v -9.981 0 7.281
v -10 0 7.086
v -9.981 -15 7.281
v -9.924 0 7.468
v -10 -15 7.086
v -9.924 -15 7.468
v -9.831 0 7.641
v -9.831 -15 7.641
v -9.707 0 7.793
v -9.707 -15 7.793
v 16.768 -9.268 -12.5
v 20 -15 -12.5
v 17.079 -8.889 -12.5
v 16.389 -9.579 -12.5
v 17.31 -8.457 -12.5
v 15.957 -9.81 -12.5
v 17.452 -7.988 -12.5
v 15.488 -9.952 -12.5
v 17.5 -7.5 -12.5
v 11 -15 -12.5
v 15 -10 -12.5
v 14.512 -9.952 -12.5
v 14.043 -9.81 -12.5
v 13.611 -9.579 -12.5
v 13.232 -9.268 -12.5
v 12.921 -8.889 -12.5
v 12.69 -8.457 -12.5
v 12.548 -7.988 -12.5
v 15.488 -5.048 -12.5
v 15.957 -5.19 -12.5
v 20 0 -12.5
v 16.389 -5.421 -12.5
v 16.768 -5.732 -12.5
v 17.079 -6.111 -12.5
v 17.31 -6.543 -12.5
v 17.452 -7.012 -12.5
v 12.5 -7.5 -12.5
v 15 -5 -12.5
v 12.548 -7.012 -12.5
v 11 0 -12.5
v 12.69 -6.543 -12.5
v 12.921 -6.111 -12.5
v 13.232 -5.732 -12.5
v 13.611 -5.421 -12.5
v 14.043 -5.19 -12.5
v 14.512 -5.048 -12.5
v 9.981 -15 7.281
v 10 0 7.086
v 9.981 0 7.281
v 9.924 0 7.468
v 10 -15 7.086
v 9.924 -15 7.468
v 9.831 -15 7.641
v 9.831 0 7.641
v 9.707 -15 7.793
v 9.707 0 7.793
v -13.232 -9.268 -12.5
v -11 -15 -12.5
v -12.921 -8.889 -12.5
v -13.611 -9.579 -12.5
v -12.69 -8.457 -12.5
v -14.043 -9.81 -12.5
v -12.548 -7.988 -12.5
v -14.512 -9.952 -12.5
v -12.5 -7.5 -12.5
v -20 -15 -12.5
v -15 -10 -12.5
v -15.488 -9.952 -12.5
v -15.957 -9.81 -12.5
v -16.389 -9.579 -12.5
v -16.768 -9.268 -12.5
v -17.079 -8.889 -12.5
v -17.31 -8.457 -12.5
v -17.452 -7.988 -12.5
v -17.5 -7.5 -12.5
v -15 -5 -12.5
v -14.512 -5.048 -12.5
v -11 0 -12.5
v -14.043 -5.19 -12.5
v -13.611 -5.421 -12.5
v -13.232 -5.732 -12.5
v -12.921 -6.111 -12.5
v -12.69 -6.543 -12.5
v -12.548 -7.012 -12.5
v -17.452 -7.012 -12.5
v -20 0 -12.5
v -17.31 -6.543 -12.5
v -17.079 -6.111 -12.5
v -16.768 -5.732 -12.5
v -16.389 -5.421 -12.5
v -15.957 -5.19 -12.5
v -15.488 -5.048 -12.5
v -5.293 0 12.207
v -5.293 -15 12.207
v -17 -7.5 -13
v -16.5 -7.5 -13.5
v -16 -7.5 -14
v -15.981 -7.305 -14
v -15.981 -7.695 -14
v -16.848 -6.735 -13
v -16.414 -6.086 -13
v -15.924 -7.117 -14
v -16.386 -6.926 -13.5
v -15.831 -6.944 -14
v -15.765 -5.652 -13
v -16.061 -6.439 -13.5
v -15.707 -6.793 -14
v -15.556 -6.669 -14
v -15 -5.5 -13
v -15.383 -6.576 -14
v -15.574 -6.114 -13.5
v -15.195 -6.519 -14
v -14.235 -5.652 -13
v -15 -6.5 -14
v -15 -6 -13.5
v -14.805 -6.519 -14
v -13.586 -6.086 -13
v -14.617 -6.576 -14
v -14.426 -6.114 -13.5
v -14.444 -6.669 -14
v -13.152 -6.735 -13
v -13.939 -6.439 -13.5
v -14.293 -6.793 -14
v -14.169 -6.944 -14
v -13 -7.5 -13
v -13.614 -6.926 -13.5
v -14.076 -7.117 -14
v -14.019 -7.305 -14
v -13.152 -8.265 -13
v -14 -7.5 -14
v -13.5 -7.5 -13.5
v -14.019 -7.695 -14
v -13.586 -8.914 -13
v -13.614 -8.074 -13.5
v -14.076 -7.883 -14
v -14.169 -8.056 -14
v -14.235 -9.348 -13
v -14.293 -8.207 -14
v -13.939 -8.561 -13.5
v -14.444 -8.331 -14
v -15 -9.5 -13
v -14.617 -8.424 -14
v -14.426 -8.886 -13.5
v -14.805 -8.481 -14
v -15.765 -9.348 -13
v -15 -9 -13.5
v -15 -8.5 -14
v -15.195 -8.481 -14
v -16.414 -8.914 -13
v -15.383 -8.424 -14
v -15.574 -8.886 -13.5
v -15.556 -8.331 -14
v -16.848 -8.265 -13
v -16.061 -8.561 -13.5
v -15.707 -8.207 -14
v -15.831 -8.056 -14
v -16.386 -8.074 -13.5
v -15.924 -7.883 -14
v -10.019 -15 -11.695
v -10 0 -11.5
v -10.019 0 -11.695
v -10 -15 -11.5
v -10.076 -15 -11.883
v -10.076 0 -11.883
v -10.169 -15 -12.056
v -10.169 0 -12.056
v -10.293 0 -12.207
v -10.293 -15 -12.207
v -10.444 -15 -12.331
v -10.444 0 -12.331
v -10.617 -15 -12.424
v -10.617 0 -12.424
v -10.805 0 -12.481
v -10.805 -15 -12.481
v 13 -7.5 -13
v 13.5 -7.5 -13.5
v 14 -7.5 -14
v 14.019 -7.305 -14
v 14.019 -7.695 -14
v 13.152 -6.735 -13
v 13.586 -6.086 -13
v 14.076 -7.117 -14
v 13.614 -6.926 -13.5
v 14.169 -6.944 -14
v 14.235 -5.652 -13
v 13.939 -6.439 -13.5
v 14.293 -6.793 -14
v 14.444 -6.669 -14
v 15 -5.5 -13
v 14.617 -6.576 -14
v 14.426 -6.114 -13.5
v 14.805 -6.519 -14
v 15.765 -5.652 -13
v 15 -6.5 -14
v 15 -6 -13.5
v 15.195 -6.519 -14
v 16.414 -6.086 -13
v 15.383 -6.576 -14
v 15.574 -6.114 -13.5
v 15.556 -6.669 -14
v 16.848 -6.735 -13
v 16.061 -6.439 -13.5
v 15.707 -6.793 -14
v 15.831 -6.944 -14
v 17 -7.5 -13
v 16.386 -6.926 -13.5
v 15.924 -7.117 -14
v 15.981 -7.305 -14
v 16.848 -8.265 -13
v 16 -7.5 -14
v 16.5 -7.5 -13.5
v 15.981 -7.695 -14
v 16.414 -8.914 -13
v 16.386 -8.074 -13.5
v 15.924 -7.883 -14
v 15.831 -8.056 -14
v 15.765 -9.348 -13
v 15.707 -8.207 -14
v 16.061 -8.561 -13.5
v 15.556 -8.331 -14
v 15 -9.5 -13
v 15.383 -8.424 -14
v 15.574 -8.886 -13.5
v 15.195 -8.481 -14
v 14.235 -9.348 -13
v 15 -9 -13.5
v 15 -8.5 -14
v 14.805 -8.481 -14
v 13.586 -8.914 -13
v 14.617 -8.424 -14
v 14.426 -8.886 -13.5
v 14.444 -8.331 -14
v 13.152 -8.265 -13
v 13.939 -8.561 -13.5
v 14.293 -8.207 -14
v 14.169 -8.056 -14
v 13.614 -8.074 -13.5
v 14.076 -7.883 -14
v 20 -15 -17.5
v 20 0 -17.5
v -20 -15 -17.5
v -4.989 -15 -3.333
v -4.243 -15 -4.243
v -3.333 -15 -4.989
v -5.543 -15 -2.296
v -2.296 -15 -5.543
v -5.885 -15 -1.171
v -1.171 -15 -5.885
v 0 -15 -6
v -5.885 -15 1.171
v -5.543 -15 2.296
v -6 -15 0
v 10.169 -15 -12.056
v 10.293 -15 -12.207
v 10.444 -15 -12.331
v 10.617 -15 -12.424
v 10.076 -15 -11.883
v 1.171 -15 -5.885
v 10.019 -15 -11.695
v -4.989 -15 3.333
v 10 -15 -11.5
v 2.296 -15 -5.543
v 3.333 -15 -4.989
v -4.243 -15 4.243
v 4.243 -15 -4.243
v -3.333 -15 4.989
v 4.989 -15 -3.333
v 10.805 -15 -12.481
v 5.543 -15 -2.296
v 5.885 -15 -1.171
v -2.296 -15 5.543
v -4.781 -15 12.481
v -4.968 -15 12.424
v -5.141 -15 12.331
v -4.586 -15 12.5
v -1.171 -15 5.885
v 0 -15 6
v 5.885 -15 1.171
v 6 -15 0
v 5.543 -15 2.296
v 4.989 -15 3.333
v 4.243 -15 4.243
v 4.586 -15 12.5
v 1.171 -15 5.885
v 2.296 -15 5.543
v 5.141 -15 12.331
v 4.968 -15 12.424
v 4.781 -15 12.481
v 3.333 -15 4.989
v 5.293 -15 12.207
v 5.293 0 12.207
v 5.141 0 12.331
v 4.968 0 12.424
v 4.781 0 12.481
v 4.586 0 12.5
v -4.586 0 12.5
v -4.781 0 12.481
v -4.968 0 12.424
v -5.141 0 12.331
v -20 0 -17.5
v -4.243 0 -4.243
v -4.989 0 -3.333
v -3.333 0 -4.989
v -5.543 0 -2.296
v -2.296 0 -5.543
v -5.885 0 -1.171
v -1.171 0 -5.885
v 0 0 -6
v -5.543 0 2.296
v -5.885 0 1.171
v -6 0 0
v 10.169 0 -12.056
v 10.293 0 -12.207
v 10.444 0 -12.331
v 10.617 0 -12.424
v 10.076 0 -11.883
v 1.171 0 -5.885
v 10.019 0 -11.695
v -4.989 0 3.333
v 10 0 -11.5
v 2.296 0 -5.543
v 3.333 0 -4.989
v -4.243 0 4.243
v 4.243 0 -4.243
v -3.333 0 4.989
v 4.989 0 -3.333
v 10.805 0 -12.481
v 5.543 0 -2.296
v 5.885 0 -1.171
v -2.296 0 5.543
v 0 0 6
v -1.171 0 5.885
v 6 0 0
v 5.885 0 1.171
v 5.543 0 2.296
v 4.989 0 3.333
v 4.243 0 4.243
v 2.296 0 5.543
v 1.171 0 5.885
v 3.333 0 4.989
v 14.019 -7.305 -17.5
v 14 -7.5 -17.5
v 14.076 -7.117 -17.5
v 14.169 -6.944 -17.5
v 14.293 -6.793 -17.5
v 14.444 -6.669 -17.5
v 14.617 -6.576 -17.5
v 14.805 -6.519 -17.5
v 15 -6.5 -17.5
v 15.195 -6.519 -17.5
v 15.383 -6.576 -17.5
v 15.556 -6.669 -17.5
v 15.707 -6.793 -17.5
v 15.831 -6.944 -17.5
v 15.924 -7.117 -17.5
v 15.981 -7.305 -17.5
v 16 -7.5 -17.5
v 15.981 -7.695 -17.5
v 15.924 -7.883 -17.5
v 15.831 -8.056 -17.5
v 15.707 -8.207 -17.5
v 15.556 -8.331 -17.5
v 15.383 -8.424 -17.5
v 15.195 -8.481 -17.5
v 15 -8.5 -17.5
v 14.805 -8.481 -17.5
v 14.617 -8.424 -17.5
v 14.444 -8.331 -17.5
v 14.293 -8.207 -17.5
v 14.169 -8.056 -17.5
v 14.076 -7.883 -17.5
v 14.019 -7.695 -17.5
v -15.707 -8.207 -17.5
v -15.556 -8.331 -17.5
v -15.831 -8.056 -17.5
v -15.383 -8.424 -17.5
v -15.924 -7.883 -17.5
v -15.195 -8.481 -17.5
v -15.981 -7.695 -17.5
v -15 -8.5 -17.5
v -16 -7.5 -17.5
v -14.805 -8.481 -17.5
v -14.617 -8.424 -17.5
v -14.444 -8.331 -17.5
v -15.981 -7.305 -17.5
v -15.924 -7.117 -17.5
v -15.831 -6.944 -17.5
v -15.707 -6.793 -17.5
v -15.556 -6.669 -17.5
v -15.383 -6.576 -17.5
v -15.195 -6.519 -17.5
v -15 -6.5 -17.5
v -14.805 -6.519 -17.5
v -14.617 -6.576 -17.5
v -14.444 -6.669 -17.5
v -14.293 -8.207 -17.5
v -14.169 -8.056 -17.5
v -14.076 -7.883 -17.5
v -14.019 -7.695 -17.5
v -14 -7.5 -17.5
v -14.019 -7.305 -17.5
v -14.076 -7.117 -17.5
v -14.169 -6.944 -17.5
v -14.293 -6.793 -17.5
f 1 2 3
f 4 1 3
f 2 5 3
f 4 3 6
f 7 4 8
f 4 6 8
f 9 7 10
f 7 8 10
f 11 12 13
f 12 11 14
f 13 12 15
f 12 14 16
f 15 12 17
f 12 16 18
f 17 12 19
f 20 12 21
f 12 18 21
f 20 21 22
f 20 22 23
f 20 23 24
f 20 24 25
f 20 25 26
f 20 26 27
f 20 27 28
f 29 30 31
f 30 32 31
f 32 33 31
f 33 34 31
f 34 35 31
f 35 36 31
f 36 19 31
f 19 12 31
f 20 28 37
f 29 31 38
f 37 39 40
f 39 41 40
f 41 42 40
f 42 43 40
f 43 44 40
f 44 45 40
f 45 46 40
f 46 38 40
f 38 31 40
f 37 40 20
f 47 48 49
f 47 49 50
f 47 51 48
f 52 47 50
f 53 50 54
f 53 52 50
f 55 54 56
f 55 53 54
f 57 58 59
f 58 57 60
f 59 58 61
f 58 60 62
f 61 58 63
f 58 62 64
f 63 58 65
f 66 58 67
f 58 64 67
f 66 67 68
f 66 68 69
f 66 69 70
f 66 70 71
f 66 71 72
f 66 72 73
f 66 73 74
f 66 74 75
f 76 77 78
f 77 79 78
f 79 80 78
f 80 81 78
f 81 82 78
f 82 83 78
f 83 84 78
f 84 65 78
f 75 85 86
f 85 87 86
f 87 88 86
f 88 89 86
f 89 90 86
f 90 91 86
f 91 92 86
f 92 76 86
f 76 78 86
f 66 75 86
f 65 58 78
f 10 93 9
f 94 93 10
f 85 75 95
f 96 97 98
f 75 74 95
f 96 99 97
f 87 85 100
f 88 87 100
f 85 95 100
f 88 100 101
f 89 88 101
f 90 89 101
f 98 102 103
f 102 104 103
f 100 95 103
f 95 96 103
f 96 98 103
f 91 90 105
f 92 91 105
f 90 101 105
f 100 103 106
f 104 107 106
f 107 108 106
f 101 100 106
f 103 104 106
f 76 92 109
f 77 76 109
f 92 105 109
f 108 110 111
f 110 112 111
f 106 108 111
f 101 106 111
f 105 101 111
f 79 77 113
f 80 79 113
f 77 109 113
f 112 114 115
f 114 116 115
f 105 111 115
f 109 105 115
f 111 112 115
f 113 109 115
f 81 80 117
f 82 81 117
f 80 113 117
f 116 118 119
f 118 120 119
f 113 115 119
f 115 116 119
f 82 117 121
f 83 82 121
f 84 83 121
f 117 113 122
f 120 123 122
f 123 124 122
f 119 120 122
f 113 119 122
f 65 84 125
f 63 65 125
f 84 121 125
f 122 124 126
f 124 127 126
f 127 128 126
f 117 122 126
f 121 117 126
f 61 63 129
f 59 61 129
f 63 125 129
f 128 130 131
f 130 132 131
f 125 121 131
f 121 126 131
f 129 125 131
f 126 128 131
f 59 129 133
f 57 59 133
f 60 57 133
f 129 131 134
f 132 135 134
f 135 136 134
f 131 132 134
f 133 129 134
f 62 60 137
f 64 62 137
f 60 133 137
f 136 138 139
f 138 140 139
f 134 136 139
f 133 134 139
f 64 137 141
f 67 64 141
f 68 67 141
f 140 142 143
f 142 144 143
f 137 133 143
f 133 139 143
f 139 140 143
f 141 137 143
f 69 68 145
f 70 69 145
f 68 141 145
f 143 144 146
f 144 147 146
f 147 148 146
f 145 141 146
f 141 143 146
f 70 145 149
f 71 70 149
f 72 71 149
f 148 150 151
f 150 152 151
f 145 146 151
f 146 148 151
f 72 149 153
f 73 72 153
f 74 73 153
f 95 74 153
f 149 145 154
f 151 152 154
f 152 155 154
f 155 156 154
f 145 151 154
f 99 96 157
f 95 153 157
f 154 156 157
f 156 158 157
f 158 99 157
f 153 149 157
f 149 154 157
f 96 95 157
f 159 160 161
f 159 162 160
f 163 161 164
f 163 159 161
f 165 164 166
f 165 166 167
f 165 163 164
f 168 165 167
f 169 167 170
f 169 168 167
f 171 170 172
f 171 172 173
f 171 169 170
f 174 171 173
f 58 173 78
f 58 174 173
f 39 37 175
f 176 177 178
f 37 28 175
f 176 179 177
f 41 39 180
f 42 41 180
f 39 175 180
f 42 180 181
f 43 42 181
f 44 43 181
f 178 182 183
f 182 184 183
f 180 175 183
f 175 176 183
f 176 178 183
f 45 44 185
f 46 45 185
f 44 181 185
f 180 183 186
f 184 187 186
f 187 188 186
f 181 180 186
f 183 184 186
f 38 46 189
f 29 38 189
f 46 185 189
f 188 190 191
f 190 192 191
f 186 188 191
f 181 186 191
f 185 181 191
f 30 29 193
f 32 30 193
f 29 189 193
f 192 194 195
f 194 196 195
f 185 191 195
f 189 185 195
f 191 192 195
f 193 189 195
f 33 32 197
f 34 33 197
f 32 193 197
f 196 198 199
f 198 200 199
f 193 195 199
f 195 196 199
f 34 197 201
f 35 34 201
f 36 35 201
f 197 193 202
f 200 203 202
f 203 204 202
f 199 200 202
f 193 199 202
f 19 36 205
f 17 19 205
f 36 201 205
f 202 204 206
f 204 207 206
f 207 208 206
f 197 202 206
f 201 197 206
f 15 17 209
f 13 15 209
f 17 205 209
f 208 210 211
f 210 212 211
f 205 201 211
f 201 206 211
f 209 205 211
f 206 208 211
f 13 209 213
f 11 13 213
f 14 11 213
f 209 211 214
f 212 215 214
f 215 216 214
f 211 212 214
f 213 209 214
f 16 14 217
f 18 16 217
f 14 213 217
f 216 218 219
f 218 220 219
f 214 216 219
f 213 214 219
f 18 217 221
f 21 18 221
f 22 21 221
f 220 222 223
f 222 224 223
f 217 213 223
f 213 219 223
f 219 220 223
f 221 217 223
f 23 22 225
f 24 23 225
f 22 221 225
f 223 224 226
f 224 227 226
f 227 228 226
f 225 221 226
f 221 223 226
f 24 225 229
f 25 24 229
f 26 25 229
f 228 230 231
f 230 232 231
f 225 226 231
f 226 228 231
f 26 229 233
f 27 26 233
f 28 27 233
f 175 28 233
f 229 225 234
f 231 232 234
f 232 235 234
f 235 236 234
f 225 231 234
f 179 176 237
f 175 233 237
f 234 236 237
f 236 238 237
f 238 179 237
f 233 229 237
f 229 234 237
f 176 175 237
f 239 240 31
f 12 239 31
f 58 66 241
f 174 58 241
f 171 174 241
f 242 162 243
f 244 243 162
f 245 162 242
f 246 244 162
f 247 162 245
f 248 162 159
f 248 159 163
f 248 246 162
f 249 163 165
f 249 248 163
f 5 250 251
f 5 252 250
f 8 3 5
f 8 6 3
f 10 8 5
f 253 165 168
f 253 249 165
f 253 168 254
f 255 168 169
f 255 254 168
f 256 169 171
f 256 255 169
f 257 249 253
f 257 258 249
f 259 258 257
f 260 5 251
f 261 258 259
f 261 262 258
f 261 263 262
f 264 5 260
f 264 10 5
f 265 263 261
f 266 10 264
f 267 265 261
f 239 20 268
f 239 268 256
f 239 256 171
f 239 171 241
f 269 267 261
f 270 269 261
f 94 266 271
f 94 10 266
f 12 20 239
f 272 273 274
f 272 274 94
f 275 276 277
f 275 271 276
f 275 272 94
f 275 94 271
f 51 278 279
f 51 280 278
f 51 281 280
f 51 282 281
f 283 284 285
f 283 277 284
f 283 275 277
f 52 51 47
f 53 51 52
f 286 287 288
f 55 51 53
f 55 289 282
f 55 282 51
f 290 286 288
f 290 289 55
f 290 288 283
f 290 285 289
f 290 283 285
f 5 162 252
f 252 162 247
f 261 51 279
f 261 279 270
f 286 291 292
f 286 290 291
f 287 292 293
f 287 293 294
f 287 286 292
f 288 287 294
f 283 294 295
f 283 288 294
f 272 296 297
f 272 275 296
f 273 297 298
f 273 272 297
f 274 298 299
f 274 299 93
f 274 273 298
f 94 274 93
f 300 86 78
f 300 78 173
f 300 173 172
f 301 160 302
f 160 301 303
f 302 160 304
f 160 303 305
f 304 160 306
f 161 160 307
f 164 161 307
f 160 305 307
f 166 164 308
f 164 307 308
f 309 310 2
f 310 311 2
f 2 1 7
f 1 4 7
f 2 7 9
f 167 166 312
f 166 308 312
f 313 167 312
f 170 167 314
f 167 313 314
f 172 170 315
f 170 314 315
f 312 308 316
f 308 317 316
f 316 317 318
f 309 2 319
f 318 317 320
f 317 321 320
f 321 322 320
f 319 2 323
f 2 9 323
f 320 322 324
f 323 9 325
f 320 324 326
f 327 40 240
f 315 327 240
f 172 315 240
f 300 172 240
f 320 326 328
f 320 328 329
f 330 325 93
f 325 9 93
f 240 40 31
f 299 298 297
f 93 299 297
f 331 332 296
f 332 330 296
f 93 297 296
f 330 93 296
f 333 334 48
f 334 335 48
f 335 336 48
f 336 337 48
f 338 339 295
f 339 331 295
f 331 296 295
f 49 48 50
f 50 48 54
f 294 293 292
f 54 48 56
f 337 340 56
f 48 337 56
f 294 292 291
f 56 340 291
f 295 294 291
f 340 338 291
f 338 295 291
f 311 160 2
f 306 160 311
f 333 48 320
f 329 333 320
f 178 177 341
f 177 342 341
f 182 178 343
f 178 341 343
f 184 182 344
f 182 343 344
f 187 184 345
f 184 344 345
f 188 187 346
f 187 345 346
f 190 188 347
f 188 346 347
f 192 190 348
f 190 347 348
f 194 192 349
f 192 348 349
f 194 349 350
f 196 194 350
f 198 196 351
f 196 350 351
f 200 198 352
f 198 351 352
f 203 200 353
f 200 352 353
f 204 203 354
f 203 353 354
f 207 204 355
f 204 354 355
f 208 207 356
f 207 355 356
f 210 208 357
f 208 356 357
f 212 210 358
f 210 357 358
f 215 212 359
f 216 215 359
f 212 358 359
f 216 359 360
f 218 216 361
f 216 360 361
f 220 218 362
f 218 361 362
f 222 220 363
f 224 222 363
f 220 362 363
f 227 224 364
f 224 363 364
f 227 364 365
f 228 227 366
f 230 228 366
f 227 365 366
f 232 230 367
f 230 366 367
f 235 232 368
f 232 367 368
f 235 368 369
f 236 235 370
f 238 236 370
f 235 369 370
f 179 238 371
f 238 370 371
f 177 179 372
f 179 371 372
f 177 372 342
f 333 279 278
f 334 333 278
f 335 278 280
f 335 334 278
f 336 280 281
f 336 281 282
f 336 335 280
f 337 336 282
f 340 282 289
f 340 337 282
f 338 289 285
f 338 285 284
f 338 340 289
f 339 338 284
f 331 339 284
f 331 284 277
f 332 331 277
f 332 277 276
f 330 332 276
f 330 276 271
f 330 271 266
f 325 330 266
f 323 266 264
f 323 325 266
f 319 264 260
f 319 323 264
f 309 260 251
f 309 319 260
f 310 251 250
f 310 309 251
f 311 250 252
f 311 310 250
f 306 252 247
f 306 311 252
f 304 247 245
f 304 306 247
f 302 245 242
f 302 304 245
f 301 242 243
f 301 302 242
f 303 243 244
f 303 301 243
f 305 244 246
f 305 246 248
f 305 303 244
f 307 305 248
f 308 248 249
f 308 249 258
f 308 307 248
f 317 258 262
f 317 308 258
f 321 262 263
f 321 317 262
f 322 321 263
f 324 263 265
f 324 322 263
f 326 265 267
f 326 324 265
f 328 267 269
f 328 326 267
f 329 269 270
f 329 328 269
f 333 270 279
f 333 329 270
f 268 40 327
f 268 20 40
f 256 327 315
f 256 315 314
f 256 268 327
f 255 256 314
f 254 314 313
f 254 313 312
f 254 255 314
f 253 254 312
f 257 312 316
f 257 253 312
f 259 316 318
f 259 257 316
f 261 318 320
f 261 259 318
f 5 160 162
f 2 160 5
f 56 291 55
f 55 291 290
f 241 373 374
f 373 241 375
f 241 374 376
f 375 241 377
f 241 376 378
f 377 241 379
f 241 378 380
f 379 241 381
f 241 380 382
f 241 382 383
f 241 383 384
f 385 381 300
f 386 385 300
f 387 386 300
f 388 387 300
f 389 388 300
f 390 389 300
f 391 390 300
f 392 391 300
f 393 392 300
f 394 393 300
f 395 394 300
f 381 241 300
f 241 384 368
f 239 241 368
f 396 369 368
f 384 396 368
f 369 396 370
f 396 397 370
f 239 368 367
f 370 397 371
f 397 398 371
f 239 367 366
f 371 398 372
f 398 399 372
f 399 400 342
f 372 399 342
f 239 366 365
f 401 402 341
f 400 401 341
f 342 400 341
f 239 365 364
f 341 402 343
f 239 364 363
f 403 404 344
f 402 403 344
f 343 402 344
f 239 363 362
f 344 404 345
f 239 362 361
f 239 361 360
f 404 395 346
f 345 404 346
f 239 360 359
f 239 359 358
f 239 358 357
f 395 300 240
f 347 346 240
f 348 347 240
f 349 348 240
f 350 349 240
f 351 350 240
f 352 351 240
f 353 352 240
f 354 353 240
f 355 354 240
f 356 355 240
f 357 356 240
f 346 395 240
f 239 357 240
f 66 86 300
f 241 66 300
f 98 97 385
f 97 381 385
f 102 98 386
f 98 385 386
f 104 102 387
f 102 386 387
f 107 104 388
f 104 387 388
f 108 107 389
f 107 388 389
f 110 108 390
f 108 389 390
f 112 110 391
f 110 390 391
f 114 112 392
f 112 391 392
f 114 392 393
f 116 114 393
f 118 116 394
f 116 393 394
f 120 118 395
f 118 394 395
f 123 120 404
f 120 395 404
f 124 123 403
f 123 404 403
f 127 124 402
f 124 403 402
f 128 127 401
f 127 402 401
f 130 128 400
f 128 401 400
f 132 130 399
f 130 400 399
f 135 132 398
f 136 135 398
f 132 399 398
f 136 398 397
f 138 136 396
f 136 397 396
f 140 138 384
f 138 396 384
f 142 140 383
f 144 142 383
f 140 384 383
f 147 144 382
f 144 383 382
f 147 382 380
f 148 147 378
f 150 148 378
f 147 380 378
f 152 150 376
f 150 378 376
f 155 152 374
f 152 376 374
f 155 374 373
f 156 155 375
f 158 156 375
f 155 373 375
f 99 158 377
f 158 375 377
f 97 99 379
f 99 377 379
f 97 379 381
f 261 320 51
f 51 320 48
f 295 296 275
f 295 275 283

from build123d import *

# Parameters (mm, degrees)
F0_W           = 20
F0_H           = 25
F0_R           = 6
F1_DEPTH       = 15
F2_SIZE        = 5
F4_D           = 2
F4_CSINK_D     = 5
F4_CSINK_ANGLE = 90
F5_R           = 1


with BuildPart() as f1:
    # F0 (on Front) → F1 (new body)
    with BuildSketch(Plane.XZ):
        Rectangle(F0_W, F0_H)
        Circle(F0_R, mode=Mode.SUBTRACT)
        Polygon((20, -12.5), (10, -12.5), (-10, -12.5), (-20, -12.5), (-20, -17.5), (20, -17.5), align=None)
    extrude(amount=F1_DEPTH)

    # F2
    f2_edges = [f1.edges().sort_by_distance(p)[0] for p in [
        (10, -7.5, 12.5),
        (-10, -7.5, 12.5),
    ]]
    chamfer(f2_edges, length=F2_SIZE)

    # F4 (through all)
    with Locations(Plane.XY.offset(-12.5)):
        with Locations((15, -7.5), (-15, -7.5)):
            CounterSinkHole(F4_D / 2, F4_CSINK_D / 2, counter_sink_angle=F4_CSINK_ANGLE)

    # F5
    f5_edges = [f1.edges().sort_by_distance(p)[0] for p in [
        (-10, -7.5, -12.5),
        (-10, -7.5, 7.5),
        (-5, -7.5, 12.5),
        (5, -7.5, 12.5),
        (10, -7.5, 7.5),
        (10, -7.5, -12.5),
    ]]
    fillet(f5_edges, radius=F5_R)


solid = f1.part
